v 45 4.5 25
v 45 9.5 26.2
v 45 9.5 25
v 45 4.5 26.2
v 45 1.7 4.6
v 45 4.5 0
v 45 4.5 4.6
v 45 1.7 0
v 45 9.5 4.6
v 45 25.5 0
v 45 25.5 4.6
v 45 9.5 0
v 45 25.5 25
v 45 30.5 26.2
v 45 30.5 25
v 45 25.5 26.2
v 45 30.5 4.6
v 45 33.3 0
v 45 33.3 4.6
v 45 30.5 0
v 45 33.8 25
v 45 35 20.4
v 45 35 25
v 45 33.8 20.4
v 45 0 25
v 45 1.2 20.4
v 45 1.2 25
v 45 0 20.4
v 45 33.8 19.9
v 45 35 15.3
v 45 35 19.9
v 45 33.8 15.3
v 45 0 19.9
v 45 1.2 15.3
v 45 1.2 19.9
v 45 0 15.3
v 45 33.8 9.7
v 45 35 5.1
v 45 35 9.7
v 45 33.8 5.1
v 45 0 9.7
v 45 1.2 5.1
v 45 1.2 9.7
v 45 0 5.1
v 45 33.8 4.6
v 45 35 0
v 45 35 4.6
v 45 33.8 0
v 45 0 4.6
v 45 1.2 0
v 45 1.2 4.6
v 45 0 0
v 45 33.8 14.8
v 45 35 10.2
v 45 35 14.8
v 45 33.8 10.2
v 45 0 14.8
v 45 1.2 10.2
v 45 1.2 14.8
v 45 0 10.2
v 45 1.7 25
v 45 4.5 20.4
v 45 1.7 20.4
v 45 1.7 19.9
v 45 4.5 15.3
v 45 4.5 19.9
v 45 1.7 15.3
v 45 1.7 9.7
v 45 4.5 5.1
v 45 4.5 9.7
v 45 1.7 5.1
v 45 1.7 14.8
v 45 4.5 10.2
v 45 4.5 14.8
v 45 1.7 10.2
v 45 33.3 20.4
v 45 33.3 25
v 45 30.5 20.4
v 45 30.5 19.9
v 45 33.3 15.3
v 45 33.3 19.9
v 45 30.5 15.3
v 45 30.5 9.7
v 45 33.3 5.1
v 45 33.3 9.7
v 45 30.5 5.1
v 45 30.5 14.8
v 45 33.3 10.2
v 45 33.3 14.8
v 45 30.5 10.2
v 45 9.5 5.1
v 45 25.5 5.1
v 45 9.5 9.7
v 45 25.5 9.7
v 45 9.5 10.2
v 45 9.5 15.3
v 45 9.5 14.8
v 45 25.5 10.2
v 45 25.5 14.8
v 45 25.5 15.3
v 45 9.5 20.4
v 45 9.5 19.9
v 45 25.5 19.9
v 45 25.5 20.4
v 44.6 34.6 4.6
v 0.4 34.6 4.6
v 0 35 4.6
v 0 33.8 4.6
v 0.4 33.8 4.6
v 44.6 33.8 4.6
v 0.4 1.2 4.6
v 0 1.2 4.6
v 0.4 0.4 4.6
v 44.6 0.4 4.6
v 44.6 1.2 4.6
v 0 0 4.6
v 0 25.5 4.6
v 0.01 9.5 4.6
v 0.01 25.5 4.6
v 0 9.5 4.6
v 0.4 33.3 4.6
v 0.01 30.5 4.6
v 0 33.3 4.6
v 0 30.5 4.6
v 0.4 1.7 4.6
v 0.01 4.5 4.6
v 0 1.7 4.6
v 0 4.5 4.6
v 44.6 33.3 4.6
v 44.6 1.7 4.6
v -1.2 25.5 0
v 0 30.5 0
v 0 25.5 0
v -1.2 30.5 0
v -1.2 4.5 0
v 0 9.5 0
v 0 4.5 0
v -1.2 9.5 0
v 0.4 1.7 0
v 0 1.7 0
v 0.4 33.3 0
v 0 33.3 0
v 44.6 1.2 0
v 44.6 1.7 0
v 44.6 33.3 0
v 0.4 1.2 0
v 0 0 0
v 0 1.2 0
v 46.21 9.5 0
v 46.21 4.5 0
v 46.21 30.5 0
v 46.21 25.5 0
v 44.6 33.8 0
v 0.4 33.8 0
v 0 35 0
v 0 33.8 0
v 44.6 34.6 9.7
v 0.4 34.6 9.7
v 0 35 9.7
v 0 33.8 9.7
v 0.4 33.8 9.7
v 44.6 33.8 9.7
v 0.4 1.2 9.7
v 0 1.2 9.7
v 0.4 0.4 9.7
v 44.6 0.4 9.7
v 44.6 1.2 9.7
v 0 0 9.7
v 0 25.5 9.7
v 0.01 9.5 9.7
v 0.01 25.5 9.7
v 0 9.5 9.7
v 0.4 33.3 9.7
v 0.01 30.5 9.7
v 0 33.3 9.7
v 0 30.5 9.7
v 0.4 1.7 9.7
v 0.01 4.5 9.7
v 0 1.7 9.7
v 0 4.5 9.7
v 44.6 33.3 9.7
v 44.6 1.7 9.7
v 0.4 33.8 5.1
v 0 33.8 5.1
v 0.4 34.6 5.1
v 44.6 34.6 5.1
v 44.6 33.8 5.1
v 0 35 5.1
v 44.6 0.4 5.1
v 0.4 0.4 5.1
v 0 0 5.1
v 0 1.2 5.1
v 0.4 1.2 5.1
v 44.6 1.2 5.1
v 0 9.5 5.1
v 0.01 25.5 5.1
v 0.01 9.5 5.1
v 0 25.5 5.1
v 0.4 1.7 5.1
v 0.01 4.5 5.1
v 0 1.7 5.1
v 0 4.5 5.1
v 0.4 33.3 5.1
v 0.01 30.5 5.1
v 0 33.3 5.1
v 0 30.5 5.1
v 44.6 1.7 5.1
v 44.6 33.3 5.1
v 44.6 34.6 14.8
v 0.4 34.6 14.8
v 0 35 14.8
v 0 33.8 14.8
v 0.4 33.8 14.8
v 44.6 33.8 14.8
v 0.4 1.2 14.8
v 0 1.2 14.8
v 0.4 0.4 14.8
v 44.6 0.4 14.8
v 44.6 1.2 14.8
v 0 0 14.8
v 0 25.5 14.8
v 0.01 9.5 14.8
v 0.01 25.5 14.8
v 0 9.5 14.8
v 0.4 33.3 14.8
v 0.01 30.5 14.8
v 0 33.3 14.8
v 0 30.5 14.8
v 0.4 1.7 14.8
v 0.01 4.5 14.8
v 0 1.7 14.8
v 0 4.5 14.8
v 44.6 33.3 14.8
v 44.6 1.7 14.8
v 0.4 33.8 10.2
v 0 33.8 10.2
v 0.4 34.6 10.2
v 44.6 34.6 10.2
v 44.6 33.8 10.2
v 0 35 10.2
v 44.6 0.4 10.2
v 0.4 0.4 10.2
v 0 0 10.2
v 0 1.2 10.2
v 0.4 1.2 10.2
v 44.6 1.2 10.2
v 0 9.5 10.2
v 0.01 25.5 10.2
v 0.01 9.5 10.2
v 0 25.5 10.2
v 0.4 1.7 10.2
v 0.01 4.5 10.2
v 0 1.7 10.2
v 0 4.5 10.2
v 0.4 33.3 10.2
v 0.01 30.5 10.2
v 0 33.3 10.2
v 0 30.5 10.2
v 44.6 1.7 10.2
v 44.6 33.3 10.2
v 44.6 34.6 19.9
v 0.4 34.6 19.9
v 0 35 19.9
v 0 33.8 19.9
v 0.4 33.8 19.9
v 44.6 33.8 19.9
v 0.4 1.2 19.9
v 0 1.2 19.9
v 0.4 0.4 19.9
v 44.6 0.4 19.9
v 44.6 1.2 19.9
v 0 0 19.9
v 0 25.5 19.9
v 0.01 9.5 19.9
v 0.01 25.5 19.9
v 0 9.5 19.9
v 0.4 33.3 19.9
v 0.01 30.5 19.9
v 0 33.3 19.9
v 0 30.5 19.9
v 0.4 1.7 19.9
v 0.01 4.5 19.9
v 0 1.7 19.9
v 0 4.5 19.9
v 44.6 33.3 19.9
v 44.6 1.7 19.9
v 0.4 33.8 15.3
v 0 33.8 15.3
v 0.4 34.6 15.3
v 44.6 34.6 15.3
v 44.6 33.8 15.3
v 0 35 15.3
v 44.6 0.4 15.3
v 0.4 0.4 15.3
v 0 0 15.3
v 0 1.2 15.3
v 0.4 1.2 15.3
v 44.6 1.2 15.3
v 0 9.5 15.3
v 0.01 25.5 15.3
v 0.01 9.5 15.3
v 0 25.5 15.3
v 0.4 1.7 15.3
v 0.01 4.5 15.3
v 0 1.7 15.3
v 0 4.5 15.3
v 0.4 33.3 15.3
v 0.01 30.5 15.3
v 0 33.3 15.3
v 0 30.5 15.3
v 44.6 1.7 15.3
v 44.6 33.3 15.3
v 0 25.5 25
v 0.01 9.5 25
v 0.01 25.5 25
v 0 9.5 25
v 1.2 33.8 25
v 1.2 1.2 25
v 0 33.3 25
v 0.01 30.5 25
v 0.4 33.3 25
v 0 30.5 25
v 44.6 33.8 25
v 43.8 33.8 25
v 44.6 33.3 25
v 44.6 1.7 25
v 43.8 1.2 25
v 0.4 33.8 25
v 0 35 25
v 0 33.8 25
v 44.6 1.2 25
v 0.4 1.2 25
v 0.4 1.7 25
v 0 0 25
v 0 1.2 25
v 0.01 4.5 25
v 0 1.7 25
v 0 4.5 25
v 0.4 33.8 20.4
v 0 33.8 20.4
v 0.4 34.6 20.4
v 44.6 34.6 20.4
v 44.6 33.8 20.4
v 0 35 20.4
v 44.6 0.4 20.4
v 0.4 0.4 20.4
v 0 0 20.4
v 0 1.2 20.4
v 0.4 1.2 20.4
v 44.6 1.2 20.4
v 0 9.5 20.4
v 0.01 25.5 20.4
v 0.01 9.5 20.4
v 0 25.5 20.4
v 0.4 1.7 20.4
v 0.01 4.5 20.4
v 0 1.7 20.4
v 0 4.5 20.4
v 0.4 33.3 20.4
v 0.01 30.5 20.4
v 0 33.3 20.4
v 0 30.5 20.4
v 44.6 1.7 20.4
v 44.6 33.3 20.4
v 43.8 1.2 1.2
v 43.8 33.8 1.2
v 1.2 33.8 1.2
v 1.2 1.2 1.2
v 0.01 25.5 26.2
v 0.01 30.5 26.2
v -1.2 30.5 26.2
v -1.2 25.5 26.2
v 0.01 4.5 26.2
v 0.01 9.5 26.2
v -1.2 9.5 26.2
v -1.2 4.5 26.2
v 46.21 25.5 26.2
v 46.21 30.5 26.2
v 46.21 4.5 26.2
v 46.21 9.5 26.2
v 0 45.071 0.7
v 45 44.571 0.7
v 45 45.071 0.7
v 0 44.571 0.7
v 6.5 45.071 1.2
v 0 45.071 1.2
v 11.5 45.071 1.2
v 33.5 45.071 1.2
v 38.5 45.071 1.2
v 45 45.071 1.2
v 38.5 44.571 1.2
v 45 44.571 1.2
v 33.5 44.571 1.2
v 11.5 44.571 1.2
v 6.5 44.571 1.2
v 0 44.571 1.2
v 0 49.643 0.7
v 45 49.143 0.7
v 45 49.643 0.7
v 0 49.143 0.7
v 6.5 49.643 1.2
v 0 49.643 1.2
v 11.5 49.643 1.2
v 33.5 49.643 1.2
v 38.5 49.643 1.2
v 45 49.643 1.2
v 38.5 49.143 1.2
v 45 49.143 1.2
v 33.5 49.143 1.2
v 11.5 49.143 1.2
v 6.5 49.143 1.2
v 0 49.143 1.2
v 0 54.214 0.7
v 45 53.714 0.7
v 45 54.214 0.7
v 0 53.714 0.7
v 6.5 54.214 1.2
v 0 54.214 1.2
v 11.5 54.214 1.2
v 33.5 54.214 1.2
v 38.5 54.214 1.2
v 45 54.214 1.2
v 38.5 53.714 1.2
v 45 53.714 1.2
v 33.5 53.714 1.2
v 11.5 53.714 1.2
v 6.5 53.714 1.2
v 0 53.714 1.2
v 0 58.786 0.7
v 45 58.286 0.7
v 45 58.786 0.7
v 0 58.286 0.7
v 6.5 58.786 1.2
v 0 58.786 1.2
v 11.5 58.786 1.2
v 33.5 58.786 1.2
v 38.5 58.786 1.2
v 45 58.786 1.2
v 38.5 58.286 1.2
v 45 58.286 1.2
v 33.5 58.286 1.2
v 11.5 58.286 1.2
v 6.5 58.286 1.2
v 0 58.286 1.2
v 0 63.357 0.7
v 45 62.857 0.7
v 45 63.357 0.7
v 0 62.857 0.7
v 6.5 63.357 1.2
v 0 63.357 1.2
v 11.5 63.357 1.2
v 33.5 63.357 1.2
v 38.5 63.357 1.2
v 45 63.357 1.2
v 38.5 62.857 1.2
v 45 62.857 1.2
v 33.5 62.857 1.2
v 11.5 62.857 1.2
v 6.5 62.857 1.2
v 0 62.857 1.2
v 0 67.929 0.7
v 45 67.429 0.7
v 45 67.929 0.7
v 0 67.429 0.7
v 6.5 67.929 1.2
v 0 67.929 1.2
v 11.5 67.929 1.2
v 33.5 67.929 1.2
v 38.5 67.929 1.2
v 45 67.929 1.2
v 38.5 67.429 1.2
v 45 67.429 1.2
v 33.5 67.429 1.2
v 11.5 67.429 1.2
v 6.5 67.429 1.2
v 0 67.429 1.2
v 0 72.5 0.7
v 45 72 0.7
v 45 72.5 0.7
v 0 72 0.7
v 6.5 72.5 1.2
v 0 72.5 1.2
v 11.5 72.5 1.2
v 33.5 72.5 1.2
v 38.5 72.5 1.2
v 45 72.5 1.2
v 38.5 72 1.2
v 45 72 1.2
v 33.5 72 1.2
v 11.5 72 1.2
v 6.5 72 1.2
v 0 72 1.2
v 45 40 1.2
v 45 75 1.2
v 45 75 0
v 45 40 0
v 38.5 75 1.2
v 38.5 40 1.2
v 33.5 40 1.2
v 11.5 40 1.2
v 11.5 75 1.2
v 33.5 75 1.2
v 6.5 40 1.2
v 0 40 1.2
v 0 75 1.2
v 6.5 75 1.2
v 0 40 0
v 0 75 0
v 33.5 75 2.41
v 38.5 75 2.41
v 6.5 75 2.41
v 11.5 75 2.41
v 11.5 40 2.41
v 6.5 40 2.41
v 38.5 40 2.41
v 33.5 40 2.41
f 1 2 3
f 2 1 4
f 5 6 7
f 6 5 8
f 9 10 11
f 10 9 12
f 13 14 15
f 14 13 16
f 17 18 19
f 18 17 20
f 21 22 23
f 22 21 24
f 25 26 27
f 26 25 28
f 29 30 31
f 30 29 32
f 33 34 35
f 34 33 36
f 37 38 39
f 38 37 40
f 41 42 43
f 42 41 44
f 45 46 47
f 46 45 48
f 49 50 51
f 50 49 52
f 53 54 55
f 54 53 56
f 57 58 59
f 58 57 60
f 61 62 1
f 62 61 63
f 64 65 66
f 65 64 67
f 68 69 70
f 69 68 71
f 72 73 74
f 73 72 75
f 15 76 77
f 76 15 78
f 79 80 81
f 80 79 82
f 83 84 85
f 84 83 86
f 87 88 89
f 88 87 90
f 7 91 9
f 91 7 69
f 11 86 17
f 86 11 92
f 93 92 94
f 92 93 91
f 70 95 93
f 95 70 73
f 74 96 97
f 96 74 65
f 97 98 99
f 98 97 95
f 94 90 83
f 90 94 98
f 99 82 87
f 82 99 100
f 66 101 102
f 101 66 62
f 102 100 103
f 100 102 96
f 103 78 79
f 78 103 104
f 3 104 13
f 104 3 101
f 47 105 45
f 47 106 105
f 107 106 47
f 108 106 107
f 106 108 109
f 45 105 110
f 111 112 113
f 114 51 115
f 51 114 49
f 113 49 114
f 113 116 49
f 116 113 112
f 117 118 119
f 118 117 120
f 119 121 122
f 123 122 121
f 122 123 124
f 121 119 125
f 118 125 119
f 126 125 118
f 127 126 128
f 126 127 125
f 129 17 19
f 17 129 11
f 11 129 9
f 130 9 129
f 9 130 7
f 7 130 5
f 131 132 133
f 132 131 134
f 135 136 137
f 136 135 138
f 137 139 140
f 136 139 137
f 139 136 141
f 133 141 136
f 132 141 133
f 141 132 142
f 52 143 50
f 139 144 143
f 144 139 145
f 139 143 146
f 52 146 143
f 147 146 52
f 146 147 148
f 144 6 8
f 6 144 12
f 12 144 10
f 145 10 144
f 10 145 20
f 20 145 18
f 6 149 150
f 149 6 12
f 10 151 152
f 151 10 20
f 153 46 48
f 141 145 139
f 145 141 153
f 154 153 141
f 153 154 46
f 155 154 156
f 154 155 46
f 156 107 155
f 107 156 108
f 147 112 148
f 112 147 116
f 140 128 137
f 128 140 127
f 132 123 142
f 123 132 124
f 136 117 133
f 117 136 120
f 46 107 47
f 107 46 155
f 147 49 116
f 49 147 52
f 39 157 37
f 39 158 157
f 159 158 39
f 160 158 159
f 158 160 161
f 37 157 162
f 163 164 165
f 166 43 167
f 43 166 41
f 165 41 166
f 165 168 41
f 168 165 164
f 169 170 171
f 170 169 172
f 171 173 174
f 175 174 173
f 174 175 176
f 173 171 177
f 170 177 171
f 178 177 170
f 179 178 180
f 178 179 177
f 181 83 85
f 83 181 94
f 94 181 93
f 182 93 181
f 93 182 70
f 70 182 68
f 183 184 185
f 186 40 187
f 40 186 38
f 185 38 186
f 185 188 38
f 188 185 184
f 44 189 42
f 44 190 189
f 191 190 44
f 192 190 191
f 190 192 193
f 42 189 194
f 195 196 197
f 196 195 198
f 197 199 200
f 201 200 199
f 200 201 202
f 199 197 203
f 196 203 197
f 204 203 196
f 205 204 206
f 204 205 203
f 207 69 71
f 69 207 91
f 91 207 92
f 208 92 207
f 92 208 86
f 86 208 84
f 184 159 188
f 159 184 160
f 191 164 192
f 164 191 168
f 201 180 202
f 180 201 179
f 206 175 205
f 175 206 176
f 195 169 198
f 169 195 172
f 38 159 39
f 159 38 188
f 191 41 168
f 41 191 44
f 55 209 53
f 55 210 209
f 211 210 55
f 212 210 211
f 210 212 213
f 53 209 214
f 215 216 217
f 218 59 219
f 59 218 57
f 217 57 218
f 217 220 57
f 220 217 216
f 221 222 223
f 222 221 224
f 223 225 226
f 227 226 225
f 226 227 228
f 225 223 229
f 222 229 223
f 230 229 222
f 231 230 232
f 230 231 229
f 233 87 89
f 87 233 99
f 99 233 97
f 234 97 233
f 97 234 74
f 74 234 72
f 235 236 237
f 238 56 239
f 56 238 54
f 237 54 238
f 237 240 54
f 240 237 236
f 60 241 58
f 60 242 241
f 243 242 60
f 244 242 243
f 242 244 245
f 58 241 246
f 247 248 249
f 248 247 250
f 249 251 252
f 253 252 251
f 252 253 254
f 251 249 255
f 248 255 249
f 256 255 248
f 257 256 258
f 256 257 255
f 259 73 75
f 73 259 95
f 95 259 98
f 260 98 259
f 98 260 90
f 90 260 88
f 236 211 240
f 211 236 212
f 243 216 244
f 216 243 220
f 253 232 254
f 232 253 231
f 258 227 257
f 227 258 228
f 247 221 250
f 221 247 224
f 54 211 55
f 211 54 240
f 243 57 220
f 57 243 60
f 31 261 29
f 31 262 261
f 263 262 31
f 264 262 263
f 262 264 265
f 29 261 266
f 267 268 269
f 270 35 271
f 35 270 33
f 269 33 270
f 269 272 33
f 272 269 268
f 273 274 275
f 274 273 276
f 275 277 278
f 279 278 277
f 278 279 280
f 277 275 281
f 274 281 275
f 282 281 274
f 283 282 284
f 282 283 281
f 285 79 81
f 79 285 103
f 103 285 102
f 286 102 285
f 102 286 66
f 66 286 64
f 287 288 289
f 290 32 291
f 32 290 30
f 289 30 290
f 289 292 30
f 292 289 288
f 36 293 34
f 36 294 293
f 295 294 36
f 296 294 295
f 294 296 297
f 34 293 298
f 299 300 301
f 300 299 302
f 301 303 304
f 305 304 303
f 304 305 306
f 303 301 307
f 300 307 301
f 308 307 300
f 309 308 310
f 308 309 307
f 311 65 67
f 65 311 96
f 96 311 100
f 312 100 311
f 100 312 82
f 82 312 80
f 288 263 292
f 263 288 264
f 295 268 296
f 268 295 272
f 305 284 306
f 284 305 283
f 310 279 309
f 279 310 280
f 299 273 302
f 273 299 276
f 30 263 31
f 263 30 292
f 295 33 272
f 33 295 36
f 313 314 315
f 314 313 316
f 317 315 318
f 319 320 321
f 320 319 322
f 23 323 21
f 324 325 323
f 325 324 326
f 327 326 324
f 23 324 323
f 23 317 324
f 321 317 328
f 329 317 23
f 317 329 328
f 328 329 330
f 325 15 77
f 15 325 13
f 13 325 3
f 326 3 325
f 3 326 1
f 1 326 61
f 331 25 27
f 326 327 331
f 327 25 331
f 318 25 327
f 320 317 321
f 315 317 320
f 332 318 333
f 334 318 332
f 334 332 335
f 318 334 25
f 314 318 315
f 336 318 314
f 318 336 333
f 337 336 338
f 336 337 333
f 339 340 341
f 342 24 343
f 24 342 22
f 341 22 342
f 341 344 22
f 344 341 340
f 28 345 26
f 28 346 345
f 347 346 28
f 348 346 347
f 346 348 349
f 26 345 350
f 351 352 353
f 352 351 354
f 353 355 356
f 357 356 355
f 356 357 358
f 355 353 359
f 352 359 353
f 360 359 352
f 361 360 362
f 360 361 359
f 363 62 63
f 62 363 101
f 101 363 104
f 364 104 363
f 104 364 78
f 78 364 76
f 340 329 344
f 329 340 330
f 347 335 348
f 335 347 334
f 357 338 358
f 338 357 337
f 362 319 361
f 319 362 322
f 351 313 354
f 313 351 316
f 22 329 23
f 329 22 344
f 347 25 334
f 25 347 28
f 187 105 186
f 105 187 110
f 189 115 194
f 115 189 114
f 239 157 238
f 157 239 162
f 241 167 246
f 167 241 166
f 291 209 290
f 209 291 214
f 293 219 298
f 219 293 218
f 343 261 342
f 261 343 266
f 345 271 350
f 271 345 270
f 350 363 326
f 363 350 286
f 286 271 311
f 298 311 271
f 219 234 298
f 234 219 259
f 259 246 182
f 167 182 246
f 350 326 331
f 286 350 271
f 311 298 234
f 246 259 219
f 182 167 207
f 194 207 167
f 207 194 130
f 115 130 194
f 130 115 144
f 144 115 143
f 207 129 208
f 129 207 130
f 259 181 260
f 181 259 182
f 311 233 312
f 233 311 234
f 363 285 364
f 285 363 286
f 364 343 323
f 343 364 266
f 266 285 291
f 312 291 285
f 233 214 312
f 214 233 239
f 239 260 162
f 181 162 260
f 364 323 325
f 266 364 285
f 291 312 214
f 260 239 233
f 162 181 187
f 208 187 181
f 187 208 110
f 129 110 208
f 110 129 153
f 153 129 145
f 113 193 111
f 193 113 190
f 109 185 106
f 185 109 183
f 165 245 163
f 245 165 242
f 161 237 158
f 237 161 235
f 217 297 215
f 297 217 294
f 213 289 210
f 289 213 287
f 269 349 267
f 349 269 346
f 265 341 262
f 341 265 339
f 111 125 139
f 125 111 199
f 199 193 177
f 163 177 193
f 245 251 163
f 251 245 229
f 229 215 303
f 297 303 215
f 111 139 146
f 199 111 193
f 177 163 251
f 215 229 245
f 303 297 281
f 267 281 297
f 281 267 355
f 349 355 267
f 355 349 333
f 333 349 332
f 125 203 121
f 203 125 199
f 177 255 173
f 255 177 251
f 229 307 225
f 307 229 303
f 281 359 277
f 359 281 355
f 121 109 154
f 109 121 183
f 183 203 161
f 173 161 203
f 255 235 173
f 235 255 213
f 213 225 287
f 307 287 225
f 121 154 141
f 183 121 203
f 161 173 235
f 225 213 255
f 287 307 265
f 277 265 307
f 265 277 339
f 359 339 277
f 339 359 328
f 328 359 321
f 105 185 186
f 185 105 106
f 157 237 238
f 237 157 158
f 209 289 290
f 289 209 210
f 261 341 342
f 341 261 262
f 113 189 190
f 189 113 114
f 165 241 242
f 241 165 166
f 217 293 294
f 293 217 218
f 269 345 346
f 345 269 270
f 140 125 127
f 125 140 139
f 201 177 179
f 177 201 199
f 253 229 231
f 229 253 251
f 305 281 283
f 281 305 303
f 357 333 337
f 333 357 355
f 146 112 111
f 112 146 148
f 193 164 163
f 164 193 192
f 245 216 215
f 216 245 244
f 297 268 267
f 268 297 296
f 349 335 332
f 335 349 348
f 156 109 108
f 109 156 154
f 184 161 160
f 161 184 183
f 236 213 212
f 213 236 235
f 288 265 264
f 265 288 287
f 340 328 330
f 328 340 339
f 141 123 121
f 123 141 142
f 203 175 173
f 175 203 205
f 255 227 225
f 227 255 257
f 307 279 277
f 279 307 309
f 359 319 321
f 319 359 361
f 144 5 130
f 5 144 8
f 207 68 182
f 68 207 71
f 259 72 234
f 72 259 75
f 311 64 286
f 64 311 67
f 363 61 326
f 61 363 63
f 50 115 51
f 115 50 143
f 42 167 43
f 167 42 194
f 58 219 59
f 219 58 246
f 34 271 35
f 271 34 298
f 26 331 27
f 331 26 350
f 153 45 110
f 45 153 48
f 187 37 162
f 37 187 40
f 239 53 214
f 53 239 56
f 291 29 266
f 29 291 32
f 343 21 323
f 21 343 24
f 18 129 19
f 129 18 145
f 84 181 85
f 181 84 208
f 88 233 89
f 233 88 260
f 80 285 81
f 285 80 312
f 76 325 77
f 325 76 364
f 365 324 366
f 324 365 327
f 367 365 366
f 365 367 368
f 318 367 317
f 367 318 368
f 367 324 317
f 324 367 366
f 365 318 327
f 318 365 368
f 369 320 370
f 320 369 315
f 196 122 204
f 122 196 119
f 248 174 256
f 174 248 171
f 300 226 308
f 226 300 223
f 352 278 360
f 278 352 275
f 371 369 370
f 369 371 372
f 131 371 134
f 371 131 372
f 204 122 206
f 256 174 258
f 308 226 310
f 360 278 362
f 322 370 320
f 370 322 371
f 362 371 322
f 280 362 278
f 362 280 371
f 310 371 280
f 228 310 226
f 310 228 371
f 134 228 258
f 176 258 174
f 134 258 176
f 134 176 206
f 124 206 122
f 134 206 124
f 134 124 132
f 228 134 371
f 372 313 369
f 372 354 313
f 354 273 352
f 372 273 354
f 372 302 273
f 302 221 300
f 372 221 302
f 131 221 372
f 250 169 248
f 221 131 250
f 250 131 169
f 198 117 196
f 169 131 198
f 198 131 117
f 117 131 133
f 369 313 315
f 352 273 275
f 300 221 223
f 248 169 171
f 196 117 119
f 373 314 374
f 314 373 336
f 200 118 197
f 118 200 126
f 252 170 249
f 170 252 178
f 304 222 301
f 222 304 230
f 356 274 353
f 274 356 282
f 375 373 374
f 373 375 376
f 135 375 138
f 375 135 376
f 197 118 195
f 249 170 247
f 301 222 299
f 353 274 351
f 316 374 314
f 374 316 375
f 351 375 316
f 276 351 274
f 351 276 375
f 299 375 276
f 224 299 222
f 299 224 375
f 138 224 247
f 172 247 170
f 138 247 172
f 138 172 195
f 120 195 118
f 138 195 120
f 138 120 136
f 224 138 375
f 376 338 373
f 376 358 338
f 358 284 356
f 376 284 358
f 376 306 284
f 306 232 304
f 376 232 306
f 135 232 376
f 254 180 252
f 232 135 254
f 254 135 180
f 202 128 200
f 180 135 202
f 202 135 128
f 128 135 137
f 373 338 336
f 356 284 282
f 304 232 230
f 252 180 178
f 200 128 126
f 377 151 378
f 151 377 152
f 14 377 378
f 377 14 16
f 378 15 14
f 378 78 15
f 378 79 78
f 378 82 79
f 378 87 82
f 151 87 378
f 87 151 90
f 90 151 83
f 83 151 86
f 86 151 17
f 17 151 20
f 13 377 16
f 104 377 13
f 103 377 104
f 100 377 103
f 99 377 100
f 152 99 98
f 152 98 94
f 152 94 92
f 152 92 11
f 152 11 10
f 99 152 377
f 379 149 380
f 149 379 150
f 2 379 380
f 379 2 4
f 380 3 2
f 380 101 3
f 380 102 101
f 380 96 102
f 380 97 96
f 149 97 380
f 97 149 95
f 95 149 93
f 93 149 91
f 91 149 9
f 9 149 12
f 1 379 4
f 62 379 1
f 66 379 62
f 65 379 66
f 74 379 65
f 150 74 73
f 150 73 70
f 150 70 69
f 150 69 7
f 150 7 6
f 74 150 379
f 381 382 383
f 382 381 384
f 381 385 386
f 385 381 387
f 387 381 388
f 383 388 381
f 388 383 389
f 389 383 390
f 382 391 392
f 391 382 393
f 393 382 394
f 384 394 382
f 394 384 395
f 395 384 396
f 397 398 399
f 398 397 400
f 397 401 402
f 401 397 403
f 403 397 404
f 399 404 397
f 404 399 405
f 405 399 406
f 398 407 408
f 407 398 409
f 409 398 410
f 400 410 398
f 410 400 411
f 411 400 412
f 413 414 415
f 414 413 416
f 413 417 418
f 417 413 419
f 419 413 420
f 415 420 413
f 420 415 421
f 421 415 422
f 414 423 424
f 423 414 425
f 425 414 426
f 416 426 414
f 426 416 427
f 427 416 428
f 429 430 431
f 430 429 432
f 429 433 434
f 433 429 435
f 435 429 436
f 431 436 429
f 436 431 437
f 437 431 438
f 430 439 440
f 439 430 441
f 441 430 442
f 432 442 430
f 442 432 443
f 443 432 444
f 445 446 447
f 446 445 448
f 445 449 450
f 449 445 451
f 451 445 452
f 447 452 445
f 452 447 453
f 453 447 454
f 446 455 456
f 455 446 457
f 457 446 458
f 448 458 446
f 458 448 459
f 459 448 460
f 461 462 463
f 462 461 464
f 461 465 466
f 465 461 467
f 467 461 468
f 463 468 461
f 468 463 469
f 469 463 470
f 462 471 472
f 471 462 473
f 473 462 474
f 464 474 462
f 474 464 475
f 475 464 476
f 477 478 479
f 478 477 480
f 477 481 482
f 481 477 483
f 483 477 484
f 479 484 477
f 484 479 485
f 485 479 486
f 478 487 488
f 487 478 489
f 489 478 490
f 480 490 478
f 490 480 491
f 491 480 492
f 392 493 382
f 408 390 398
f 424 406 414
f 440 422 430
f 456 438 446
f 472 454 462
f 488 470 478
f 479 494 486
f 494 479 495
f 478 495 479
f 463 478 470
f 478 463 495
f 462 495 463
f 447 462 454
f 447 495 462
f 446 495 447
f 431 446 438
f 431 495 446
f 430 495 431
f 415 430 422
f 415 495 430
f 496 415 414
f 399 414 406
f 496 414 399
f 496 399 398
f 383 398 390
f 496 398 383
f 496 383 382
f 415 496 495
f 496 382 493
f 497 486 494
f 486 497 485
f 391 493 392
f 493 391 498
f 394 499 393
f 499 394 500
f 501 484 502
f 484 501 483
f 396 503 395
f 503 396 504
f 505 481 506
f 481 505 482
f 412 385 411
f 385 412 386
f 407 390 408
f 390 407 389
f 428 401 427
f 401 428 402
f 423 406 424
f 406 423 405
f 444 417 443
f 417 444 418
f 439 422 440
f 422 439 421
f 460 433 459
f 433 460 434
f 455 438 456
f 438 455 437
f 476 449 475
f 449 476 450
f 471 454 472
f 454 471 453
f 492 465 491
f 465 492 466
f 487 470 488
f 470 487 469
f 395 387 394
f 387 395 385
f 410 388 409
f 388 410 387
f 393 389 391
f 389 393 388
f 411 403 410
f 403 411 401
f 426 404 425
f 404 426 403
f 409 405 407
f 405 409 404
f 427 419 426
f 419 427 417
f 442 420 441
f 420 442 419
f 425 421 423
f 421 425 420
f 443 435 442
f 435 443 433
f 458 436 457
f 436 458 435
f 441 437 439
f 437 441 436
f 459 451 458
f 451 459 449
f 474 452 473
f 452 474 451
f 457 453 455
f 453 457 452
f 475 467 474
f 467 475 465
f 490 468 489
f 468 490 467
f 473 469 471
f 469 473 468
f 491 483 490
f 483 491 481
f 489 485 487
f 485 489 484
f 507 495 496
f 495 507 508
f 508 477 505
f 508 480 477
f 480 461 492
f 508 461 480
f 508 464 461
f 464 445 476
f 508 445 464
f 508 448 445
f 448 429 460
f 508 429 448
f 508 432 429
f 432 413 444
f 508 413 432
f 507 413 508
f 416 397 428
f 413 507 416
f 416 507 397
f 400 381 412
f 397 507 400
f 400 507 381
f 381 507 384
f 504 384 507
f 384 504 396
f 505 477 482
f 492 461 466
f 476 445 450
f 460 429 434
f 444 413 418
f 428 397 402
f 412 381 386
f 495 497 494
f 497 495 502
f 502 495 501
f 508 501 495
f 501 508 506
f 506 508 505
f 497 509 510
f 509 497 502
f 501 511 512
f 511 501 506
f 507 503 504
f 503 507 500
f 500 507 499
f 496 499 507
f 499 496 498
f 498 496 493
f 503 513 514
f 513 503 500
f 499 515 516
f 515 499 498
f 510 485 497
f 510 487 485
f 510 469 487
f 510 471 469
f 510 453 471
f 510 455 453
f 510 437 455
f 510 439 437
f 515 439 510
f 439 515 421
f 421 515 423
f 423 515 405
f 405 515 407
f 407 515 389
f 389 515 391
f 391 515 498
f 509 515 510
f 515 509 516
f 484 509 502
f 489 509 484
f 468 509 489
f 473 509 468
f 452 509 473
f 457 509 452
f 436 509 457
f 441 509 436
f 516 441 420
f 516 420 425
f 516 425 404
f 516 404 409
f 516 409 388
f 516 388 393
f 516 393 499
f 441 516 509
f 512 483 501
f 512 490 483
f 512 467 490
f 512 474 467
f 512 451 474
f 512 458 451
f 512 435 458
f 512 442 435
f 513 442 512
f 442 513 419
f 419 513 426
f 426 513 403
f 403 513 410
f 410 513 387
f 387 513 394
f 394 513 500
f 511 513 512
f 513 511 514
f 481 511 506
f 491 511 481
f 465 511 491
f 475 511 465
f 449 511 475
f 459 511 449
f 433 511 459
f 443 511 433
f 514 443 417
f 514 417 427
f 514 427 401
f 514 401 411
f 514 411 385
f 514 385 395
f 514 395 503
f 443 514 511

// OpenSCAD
/* [Parameters] */

parts = 3; // [3:both, 1:box_only, 2:lid_only]
addHandleHoles = 0; // [0:no, 1:yes]

width = 45;
depth = 35;
height = 25;

/* [Hidden] */
$fn = 32;
plankThickness = 1.2;
plankWidth = 5;
plankGap = 0.5;
gapDepth = 0.4;
ropeGap = 5;
ropeR = 1.1;

// preview[view:north east, tilt:top diagonal]

module crate(w, h, d, addHandle) {
    
    if (addHandle) {
        
        difference() {
        difference() {
        
        crateMain(w,h,d);
        
        translate([-w/2,d/2+ropeGap/2,h-(plankWidth/2)])
        rotate([0,90,0])
        cylinder(r=ropeR, h=w*2);
        }
        translate([-w/2,d/2-ropeGap/2,h-(plankWidth/2)])
        rotate([0,90,0])        
        cylinder(r=ropeR, h=w*2);
    }
    }
    else {
        crateMain(w,h,d);
    }

}

module crateMain(w, h, d) {
    
    pnumH = floor(h / plankWidth);
    modPlankH = (h - ((pnumH-1) * plankGap)) / pnumH;

union() { 
    difference() {
    
    difference() {
        difference() {
            difference() {   
                difference() {
                    union() {
                        for (i = [0:pnumH-1]) {
                            translate([0, 0, i * (modPlankH + plankGap)])
                            cube([w, d, modPlankH]);
                        }
                        
                        translate([gapDepth,gapDepth,0])
                        cube([w-(2*gapDepth), d-(2*gapDepth), h]);
                    }
                
                    translate([-(10-gapDepth), plankThickness, 0])
                    cube([10, plankGap, h*2]);
                }
            translate([-(10-gapDepth), d-plankGap-plankThickness, 0])
            cube([10, plankGap, h*2]);
          }
            translate([w-gapDepth, plankThickness, 0])
            cube([10, plankGap, h*2]);
            }
        translate([w-gapDepth, d-plankGap-plankThickness, 0])
        cube([10, plankGap, h*2]);
    }    

    translate([plankThickness, plankThickness, plankThickness])
    cube([w-(plankThickness*2), d-(plankThickness*2), h*2]);
}

        mid = d/2;
        offset = mid * 0.6;

        // vertical planks
        translate([-plankThickness,mid+offset-plankWidth/2,0])
        cube([plankThickness+0.01, plankWidth, h+plankThickness]);
        
        translate([-plankThickness,mid-offset-plankWidth/2,0])
        cube([plankThickness+0.01, plankWidth, h+plankThickness]);
        
        translate([w,mid+offset-plankWidth/2,0])
        cube([plankThickness+0.01, plankWidth, h+plankThickness]);
        
        translate([w,mid-offset-plankWidth/2,0])
        cube([plankThickness+0.01, plankWidth, h+plankThickness]);  
}
}

module lid(w, d) {
    
    pnumD = floor(d / plankWidth);
    modPlankD = (d - ((pnumD - 1) * plankGap)) / pnumD;
    
    
    
    union() {
        difference() {
        cube([w,d,plankThickness]);
    
        union() {
        for (i=[1:pnumD]) {
            translate([-w/2, i*modPlankD, plankThickness-plankGap])
            cube([w*2, plankGap, 10]);
        }
        translate([0, 0, plankThickness*3])
        cube([w, d, 10]);
        }
    }
        mid = w/2;
        offset = mid * 0.6;
        
        translate([mid+offset - plankWidth/2,0,plankThickness])
        cube([plankWidth, d, plankThickness+0.01]);

        translate([mid-offset - plankWidth/2,0,plankThickness])
        cube([plankWidth, d, plankThickness+0.01]);
    }    
}

module crateOld(w, h, d) {
    
    pnumH = round(h / plankWidth);
    modPlankH = h / pnumH;
    
    union() {
        difference() {
            cube([w,d,h]);
            translate([plankThickness,plankThickness,plankThickness])
            cube([w - (plankThickness*2), 
                d - (plankThickness*2), 
                h*2]);
        }
        
        for (i = [0:pnumH-2]) {
            translate([-(w/2), 0, (i+1) * modPlankH])
            cube([w*2, 10, plankGap]);
        }
        
        // vertical planks
        translate([-plankThickness, d-plankWidth-2,0])
        cube([plankThickness+0.01, plankWidth, h+plankThickness]);
        
        translate([-plankThickness,2,0])
        cube([plankThickness+0.01, plankWidth, h+plankThickness]);
        
        translate([w,d-plankWidth-2,0])
        cube([plankThickness+0.01, plankWidth, h+plankThickness]);
        
        translate([w,2,0])
        cube([plankThickness+0.01, plankWidth, h+plankThickness]);    
    }
}

module lidOld(w, d) {

    union() {
        cube([w,d,plankThickness]);
        
        mid = w/2;
        offset = mid * 0.6;
        
        translate([mid+offset - plankWidth/2,0,plankThickness])
        cube([plankWidth, d, plankThickness+0.01]);

        translate([mid-offset - plankWidth/2,0,plankThickness])
        cube([plankWidth, d, plankThickness+0.01]);
    }
}



module fullCrate(w, h, d, addHandle, parts) {
    
    if (parts > 0) {    
        if (parts % 2 == 1) {
        
        crate(w, h, d, addHandle);
        }
        
        if (parts > 1) {
            translate([0,d+5,0])
            lid(w, d);
        }
    }
}





fullCrate(width, height, depth, addHandleHoles, parts);
 
